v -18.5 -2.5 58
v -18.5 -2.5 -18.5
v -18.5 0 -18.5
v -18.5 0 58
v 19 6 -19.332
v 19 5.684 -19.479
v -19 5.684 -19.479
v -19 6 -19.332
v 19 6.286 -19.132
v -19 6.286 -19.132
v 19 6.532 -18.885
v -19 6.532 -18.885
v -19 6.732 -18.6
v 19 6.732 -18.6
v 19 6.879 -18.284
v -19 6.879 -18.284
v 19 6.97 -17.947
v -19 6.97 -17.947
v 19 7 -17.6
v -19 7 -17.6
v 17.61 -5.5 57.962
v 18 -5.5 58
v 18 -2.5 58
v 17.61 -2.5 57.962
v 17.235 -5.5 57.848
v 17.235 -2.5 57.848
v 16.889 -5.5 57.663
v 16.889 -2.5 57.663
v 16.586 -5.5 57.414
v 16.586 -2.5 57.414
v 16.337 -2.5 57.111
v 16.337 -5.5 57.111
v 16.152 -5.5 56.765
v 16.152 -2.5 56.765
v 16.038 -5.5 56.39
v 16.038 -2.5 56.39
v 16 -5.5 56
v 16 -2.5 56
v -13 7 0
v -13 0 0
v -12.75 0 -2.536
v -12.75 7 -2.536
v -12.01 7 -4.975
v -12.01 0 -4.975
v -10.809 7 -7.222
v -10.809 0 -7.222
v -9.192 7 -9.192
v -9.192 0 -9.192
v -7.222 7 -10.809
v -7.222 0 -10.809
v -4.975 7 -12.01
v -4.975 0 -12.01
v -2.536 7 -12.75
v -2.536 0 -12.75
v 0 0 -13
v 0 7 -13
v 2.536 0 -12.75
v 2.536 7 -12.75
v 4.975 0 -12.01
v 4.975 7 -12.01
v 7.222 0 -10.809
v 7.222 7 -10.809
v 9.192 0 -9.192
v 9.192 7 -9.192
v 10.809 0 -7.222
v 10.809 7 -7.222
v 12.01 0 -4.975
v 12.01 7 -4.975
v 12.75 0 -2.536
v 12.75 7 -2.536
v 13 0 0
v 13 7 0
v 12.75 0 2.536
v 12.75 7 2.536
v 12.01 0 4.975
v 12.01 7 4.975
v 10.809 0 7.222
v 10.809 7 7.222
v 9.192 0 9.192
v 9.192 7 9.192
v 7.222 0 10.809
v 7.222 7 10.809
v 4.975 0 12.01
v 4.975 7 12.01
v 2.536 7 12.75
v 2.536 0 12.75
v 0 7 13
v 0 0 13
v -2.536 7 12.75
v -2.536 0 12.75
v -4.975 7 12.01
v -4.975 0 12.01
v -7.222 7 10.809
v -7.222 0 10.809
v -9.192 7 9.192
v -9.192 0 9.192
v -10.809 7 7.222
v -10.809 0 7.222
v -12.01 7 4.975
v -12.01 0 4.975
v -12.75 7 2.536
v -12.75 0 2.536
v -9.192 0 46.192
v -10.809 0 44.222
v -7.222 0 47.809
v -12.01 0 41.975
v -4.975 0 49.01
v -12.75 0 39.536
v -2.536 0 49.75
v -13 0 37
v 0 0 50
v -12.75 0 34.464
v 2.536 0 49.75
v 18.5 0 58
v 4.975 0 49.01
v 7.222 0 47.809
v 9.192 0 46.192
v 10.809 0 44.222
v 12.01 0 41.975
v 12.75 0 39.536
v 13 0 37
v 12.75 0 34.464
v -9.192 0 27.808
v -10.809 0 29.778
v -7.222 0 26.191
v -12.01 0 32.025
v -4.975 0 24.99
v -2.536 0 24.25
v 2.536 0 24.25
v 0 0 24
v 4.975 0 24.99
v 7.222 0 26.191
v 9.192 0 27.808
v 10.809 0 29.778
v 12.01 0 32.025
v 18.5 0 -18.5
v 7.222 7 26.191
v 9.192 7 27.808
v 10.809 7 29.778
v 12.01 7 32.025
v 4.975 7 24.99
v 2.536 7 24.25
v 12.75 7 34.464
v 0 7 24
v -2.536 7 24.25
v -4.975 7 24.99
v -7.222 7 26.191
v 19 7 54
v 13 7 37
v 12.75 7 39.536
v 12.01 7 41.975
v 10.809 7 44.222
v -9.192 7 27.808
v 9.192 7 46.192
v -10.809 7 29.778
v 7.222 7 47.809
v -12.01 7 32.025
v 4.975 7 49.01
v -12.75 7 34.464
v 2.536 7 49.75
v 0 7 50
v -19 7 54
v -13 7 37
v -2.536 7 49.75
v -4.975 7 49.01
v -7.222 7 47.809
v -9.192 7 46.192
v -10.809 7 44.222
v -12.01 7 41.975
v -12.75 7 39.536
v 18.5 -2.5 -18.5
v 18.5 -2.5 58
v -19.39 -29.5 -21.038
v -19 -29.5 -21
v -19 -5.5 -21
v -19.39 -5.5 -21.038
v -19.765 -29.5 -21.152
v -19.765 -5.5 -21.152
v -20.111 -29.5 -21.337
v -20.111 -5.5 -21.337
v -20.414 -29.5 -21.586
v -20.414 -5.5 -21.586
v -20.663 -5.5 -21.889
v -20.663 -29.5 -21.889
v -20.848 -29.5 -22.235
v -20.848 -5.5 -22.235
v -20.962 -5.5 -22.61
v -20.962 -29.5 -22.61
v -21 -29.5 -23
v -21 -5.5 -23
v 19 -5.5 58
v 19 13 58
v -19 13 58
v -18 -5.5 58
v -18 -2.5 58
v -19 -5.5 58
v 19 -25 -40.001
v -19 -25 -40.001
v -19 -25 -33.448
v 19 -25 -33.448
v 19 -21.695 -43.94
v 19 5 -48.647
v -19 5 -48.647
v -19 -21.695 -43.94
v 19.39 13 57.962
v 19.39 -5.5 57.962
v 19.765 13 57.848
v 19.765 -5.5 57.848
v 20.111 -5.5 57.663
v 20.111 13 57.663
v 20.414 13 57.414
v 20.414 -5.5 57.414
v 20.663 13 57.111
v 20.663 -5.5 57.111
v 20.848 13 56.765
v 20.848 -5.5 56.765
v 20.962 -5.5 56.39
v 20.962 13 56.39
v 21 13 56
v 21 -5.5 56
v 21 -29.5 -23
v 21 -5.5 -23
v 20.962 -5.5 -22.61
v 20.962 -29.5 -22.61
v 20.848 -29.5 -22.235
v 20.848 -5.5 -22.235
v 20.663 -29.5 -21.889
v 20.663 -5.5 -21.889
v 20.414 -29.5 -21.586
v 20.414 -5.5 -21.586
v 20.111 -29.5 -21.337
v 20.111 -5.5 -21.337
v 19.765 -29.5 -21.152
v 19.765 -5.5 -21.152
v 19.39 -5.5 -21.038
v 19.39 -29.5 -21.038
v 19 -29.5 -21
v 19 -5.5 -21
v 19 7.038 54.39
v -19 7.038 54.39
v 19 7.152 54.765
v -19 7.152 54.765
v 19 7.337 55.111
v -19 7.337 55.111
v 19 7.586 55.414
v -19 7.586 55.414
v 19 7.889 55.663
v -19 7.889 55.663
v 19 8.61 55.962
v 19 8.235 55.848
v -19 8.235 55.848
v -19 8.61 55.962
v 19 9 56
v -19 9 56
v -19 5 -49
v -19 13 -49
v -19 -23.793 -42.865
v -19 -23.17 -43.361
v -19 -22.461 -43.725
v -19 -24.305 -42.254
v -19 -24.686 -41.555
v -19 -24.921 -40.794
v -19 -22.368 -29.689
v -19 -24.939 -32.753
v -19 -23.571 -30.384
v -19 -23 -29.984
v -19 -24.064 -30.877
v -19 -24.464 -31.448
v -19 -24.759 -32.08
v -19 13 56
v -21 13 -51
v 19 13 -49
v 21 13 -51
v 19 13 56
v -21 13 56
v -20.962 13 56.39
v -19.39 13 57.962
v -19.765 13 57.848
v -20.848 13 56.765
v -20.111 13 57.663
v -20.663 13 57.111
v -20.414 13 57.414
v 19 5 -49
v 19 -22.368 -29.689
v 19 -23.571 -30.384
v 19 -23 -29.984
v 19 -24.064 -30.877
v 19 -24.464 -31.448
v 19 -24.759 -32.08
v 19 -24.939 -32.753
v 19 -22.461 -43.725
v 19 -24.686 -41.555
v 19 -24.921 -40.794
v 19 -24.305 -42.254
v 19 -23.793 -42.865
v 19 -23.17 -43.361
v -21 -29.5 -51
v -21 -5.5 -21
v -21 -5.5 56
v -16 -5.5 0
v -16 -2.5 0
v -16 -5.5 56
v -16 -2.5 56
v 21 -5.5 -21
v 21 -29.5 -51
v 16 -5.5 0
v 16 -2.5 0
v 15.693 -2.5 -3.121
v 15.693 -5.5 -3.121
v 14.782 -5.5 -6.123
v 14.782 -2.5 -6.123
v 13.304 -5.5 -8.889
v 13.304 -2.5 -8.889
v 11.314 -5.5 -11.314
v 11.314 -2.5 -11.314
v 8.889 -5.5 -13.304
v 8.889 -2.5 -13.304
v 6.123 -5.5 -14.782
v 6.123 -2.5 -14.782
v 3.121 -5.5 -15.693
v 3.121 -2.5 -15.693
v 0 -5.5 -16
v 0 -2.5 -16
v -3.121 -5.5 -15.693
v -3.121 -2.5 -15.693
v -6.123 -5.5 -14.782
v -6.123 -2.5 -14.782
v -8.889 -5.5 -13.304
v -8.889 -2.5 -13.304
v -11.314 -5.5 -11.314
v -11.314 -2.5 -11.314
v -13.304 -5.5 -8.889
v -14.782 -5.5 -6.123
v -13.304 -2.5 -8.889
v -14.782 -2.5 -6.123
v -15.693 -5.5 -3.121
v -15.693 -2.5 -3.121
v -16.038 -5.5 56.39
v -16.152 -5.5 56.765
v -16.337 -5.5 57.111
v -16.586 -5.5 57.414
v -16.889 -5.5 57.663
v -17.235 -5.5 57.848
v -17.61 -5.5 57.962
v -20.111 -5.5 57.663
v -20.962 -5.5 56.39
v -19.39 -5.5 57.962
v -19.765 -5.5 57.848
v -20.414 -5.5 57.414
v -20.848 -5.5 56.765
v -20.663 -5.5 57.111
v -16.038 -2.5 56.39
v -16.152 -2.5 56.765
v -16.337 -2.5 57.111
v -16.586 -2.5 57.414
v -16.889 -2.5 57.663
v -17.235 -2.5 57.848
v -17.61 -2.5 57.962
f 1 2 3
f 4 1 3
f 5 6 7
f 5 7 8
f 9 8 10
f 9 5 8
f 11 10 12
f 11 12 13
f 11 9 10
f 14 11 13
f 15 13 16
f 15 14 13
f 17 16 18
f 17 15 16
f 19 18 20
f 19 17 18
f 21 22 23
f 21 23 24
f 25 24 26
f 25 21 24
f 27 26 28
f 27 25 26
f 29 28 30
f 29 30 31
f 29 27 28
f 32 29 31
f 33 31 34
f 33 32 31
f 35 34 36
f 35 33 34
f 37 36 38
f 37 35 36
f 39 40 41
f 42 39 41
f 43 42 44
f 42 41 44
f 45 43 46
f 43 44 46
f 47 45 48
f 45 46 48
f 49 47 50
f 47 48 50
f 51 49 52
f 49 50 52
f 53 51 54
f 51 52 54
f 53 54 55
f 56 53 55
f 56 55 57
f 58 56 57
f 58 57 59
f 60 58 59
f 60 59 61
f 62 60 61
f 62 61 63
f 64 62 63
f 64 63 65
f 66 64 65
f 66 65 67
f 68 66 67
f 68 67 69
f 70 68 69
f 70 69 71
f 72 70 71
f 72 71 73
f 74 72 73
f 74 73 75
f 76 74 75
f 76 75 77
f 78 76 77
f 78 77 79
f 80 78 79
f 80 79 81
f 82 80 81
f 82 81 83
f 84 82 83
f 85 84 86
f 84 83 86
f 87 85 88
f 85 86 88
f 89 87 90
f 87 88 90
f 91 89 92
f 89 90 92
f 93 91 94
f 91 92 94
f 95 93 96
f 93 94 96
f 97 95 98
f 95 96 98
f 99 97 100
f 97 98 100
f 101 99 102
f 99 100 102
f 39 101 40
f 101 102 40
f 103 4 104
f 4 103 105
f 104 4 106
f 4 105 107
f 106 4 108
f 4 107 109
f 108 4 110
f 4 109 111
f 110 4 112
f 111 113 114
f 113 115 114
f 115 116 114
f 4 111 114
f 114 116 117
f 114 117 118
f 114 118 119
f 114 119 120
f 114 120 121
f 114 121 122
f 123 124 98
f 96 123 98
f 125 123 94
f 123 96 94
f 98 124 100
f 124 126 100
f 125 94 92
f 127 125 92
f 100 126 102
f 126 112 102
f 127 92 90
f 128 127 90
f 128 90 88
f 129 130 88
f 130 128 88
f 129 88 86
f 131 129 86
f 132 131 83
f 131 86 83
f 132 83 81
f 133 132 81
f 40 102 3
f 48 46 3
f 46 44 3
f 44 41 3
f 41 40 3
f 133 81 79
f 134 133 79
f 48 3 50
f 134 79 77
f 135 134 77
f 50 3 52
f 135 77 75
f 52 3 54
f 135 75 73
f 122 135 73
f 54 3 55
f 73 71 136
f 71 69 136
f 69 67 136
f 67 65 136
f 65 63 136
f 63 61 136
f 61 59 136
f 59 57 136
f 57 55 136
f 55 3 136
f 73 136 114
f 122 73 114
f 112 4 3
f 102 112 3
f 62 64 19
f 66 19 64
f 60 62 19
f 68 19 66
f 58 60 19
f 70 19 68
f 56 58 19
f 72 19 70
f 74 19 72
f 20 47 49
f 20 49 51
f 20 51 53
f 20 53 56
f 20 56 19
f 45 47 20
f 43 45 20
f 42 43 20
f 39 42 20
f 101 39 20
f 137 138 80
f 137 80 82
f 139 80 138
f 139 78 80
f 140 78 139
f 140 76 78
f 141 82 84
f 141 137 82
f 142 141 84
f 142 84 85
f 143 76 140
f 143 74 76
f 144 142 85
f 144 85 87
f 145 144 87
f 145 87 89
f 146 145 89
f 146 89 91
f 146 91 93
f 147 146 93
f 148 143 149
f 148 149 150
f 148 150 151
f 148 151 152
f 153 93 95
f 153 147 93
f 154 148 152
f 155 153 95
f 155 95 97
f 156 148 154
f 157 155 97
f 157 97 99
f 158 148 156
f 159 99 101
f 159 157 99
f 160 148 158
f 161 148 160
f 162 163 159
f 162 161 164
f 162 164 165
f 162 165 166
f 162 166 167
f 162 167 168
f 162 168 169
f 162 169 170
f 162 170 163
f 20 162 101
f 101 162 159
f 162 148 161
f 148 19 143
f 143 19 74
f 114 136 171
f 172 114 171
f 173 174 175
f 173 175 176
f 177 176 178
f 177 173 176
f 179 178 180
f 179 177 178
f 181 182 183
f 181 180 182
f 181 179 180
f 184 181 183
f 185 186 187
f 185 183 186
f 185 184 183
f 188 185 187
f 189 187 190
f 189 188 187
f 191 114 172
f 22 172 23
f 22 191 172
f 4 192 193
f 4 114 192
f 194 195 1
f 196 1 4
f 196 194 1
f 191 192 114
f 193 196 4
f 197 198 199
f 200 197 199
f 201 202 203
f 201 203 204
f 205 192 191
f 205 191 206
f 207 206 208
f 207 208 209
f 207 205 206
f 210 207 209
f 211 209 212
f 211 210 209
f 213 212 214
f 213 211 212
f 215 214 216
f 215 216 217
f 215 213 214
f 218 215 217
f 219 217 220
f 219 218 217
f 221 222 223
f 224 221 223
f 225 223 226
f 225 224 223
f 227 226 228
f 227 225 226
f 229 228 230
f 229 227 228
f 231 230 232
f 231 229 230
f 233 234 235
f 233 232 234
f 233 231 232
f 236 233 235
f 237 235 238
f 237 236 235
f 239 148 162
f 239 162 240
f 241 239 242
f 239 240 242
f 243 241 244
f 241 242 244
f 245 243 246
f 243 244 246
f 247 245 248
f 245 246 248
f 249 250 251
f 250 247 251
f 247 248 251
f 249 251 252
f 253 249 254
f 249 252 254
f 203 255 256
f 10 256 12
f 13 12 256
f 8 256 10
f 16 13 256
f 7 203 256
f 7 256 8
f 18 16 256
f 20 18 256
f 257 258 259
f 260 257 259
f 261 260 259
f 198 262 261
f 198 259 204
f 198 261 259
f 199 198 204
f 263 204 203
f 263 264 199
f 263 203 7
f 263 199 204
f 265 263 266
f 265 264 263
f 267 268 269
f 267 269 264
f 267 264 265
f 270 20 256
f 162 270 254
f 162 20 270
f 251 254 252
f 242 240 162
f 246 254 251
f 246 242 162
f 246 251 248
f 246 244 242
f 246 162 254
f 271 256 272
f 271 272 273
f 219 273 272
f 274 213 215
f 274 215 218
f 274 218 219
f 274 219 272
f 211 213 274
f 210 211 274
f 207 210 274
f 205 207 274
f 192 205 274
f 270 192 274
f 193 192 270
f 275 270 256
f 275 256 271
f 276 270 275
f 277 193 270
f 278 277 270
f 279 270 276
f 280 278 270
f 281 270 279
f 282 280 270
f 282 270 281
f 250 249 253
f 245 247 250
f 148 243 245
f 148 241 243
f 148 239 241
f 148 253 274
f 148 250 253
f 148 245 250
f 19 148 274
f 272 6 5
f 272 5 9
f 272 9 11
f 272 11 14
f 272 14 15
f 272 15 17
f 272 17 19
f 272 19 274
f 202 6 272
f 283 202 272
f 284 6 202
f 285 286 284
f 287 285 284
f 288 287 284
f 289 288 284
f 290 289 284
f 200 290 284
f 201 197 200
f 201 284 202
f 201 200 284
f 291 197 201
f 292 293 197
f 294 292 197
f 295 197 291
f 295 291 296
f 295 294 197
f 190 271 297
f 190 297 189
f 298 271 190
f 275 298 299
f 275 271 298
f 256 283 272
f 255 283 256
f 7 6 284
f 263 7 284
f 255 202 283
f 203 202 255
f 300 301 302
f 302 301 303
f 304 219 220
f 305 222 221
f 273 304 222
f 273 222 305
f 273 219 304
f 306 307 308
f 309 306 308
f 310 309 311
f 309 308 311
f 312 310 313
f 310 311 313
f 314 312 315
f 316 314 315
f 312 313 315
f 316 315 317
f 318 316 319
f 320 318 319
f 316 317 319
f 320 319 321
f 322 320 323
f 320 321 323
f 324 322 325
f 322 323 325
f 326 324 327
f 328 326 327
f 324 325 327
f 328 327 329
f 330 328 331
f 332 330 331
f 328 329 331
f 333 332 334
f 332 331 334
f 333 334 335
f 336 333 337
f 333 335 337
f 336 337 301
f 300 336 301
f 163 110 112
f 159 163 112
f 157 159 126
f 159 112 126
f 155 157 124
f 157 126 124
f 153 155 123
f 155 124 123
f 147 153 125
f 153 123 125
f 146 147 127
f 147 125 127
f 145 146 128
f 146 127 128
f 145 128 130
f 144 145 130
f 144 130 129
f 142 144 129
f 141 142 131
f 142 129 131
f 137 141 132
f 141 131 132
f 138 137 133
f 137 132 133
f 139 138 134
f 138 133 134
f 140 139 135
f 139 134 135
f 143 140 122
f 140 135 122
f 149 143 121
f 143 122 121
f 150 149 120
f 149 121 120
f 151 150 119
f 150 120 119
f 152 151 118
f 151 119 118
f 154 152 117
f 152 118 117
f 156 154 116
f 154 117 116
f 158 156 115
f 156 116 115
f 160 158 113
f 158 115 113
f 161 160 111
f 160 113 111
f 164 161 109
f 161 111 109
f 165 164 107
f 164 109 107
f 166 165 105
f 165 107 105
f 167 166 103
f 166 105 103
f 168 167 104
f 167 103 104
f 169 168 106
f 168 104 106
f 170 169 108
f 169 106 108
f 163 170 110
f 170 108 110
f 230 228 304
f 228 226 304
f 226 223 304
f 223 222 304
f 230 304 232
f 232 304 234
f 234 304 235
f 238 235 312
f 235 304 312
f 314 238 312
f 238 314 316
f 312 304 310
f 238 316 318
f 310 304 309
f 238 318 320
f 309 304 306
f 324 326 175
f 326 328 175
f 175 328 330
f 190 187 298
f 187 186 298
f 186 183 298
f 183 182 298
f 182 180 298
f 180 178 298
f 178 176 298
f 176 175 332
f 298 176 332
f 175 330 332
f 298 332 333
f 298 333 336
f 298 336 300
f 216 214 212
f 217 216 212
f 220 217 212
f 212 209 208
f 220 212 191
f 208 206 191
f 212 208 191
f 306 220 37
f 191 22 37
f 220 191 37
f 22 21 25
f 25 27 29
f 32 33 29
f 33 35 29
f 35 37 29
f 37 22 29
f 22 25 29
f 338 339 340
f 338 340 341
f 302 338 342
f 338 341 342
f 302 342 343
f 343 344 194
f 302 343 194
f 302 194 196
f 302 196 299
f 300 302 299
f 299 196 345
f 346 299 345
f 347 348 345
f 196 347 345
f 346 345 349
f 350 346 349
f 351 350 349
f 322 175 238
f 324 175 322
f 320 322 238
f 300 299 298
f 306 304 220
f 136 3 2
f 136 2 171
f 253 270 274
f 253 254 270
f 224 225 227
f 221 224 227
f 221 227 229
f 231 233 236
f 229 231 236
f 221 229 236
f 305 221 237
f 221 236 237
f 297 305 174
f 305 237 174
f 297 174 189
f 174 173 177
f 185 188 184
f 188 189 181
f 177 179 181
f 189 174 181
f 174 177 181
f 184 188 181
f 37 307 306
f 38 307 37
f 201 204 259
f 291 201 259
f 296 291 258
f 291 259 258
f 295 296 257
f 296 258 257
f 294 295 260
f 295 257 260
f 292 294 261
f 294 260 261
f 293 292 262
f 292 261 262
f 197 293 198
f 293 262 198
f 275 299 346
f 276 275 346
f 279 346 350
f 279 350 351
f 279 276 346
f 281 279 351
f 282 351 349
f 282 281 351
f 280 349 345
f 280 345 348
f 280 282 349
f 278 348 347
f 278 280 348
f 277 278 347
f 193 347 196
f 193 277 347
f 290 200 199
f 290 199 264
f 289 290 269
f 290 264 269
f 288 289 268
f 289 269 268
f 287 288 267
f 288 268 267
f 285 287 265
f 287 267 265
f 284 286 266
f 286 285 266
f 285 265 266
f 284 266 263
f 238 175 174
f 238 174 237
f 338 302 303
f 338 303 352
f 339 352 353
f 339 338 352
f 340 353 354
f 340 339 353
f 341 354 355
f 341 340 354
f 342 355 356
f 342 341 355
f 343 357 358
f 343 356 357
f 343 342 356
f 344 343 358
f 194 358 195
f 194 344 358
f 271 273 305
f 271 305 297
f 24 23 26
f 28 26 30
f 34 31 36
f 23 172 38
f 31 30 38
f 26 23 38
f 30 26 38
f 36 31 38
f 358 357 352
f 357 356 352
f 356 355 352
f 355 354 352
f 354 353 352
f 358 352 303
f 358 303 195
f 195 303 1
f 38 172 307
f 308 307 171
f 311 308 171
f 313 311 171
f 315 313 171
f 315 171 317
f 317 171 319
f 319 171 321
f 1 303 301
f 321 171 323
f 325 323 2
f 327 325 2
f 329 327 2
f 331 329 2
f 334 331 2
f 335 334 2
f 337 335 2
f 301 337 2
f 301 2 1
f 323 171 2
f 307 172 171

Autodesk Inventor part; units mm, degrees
ref_plane "YZ Plane" through (0, 0, 0) normal (1, 0, 0) x (0, 1, 0)
ref_plane "XY Plane" through (0, 0, 0) normal (0, 0, 1) x (1, 0, 0)
sketch "Sketch1" plane through (0, 0, 0) normal (0, 1, 0) x (-1, 0, 0)
  line L0 (25.9, 0) -> (-25.9, 0) projected
  line L1 (0, -25.9) -> (0, 25.9) projected
  circle A0 centre (0, 0) radius 18.5 construction
  circle A1 centre (0, 0) radius 13 construction
  dimension "d0" = 37
  dimension "d1" = 26
sketch "Sketch2" plane through (0, 0, 0) normal (0, 1, 0) x (-1, 0, 0)
  line L0 (29.4, 0) -> (-29.4, 0) projected
  line L1 (0, -36.8) -> (0, 73.8) projected
  line L2 (-21, 58) -> (-21, -21)
  line L3 (-21, -21) -> (21, -21)
  line L4 (21, -21) -> (21, 58)
  line L5 (-21, 58) -> (21, 58)
  point P0 (0, 0)
  dimension "d3" = 42
  dimension "d29" = 21
  dimension "d30" = 58
extrude "Extrusion1" add sketch "Sketch2" along normal blind 7
sketch "Sketch6" plane through (0, 0, 0) normal (0, 1, 0) x (-1, 0, 0)
  line L0 (21, -21) -> (-21, -21) projected
  line L1 (21, 58) -> (21, -21) projected
  line L2 (-21, -21) -> (21, -21)
  line L3 (21, -21) -> (21, 58)
  line L4 (-21, 58) -> (-21, -21)
  line L5 (29.4, 0) -> (-29.4, 0) projected
  line L6 (0, -36.3) -> (0, 70.8) projected
  arc A0 (-16, 0) -> (16, 0) centre (0, 0) ccw
  line L7 (16, 0) -> (16, 58)
  line L8 (21, 58) -> (-21, 58) projected
  line L9 (16, 58) -> (21, 58)
  line L10 (-16, 0) -> (-16, 58)
  line L11 (-16, 58) -> (-21, 58)
  point P0 (-17.3617, -21)
  dimension "d18" = 32
extrude "Extrusion5" add sketch "Sketch6" against normal blind 5.5 contours L0 L6 A0 L5 L1 | L0 L4 L5 A0 L6 | L5 L7 L8 L1 | L4 L8 L10 L5
sketch "Sketch4" plane through (0, 0, 0) normal (0, 0, 1) x (1, 0, 0)
  line L0 (-18.5, 0) -> (18.5, 0)
  line L1 (18.5, 0) -> (18.5, -2.5)
  line L2 (18.5, -2.5) -> (-18.5, -2.5)
  line L3 (-18.5, -2.5) -> (-18.5, 0)
  line L4 (-25.9, 0) -> (25.9, 0) projected
  line L5 (0, -3) -> (0, 0.5) projected
  point P0 (0, 0)
  dimension "d10" = 37
  dimension "d11" = 2.5
extrude "Extrusion6" cut sketch "Sketch4" against normal blind 21
sketch "Sketch5" plane through (0, 0, 0) normal (0, 1, 0) x (-1, 0, 0)
  circle A0 centre (0, 0) radius 18.5 construction
  circle A1 centre (0, 0) radius 18.5 construction
  line L0 (25.9, 0) -> (-25.9, 0) projected
  line L1 (0, -28.9) -> (0, 26.4) projected
  line L2 (-18.5, -21) -> (18.5, -21)
  line L3 (18.5, -21) -> (18.5, -18.5)
  line L4 (18.5, -18.5) -> (-18.5, -18.5)
  line L5 (-18.5, -18.5) -> (-18.5, -21)
  dimension "d25" = 37
  dimension "d26" = 21
extrude "Extrusion7" add sketch "Sketch5" against normal blind 2.5
sketch "Sketch7" plane through (0, 0, 0) normal (0, 0, 1) x (1, 0, 0)
  line L0 (-18.5, 0) -> (18.5, 0)
  line L1 (18.5, 0) -> (18.5, -2.5)
  line L2 (18.5, -2.5) -> (-18.5, -2.5)
  line L3 (-18.5, -2.5) -> (-18.5, 0)
  line L4 (16, 0) -> (-16, 0) projected
  line L5 (-25.9, 0) -> (25.9, 0) projected
  line L6 (0, -3) -> (0, 0.5) projected
  dimension "d53" = 2.5
  dimension "d54" = 18.5
extrude "Extrusion8" cut sketch "Sketch7" along normal blind 58
sketch "Sketch8" plane through (0, 0, 0) normal (0, 1, 0) x (-1, 0, 0)
  circle A0 centre (0, 0) radius 13
  dimension "d34" = 26
extrude "Extrusion9" cut sketch "Sketch8" along normal through all
pattern_linear "Rectangular Pattern1" count 2 spacing 37 along (0, 0, 1) of "Extrusion9"
sketch "Sketch9" plane through (0, 7, 0) normal (0, 1, 0) x (1, 0, 0)
  circle A0 centre (0, 0) radius 13
  circle A1 centre (0, 0) radius 15
  dimension "d40" = 26
  dimension "d41" = 30
extrude "Extrusion10" [suppressed]
sketch "Sketch10" plane through (0, 5, 0) normal (0, 1, 0) x (1, 0, 0)
  arc A0 (16, 0) -> (-16, 0) centre (0, 0) ccw projected
  line L0 (1.5, -18) -> (-1.5, -18)
  line L1 (-29.4, 0) -> (29.4, 0) projected
  line L2 (0, 36.3) -> (0, -70.8) projected
  line L3 (1.5, -12) -> (-1.5, -12)
  line L4 (1.5, -12) -> (1.5, -18)
  line L5 (-1.5, -18) -> (-1.5, -12)
  dimension "d48" = 3
  dimension "d49" = 12
  dimension "d50" = 6
extrude "Extrusion11" [suppressed]
ref_plane "Work Plane1" through (0, 5, 0) normal (0, 1, 0) x (-1, 0, 0)
sketch "Sketch12" plane through (0, 5, 0) normal (0, 1, 0) x (-1, 0, 0)
  line L0 (21, 58) -> (21, -21) projected
  line L1 (21, -21) -> (-21, -21)
  line L2 (-21, -21) -> (-21, -51)
  line L3 (-21, -51) -> (21, -51)
  line L4 (21, -51) -> (21, -21)
  point P0 (0, 0)
  dimension "d61" = 42
  dimension "d62" = 30
extrude "Extrusion12" add sketch "Sketch12" against normal blind 34.5
sketch "Sketch13" plane through (0, 0, 0) normal (1, 0, 0) x (0, 1, 0)
  line L0 (-31.4, 0) -> (13.4, 0) projected
  line L1 (0, -62.5) -> (0, 32) projected
  line L2 (7, -19) -> (7, -49)
  line L3 (7, -49) -> (-25, -43.3575)
  line L4 (-25, -43.3575) -> (-25, -30.647)
  line L5 (7, -19) -> (-25, -30.647)
  point P0 (0, 0)
  dimension "d85" = 25
  dimension "d86" = 7
  dimension "d87" = 49
  dimension "d88" = 30
  dimension "d89" = 100
  dimension "d90" = 110
extrude "Extrusion14" cut sketch "Sketch13" along normal mid plane 38
sketch "Sketch14" plane through (0, 5, 0) normal (0, 1, 0) x (-1, 0, 0)
  line L0 (0, -72.3) -> (0, 76.8) projected
  line L1 (19, 56) -> (-19, 56)
  line L2 (-19, 56) -> (-19, -49)
  line L3 (-19, -49) -> (19, -49)
  line L4 (19, -49) -> (19, 56)
  line L5 (21, 58) -> (-21, 58)
  line L6 (-21, 58) -> (-21, -51)
  line L7 (-21, -51) -> (21, -51)
  line L8 (21, -51) -> (21, 58)
  line L9 (29.4, 0) -> (-29.4, 0) projected
  dimension "d91" = 51
  dimension "d92" = 58
  dimension "d93" = 42
  dimension "d94" = 38
  dimension "d95" = 56
  dimension "d96" = 49
extrude "Extrusion15" add sketch "Sketch14" along normal blind 8 contours L7 L6 L9 L2 L3 L0 | L0 L3 L4 L9 L8 L7 | L6 L5 L0 L1 L2 L9 | L9 L4 L1 L0 L5 L8
fillet "Fillet3" radius 2 2 edges at (21, 3.75, 58) (-21, 3.75, 58)
fillet "Fillet4" radius 2 2 edges at (16, -4, 58) (-16, -4, 58)
fillet "Fillet5" radius 2 2 edges at (21, -17.5, -21) (-21, -17.5, -21)
fillet "Fillet6" radius 2 2 edges at (0, 7, 56) (0, 7, -19)
fillet "Fillet7" radius 4 2 edges at (0, -25, -30.647) (0, -25, -43.3575)
properties part number "NespressoSpeedfiller"
